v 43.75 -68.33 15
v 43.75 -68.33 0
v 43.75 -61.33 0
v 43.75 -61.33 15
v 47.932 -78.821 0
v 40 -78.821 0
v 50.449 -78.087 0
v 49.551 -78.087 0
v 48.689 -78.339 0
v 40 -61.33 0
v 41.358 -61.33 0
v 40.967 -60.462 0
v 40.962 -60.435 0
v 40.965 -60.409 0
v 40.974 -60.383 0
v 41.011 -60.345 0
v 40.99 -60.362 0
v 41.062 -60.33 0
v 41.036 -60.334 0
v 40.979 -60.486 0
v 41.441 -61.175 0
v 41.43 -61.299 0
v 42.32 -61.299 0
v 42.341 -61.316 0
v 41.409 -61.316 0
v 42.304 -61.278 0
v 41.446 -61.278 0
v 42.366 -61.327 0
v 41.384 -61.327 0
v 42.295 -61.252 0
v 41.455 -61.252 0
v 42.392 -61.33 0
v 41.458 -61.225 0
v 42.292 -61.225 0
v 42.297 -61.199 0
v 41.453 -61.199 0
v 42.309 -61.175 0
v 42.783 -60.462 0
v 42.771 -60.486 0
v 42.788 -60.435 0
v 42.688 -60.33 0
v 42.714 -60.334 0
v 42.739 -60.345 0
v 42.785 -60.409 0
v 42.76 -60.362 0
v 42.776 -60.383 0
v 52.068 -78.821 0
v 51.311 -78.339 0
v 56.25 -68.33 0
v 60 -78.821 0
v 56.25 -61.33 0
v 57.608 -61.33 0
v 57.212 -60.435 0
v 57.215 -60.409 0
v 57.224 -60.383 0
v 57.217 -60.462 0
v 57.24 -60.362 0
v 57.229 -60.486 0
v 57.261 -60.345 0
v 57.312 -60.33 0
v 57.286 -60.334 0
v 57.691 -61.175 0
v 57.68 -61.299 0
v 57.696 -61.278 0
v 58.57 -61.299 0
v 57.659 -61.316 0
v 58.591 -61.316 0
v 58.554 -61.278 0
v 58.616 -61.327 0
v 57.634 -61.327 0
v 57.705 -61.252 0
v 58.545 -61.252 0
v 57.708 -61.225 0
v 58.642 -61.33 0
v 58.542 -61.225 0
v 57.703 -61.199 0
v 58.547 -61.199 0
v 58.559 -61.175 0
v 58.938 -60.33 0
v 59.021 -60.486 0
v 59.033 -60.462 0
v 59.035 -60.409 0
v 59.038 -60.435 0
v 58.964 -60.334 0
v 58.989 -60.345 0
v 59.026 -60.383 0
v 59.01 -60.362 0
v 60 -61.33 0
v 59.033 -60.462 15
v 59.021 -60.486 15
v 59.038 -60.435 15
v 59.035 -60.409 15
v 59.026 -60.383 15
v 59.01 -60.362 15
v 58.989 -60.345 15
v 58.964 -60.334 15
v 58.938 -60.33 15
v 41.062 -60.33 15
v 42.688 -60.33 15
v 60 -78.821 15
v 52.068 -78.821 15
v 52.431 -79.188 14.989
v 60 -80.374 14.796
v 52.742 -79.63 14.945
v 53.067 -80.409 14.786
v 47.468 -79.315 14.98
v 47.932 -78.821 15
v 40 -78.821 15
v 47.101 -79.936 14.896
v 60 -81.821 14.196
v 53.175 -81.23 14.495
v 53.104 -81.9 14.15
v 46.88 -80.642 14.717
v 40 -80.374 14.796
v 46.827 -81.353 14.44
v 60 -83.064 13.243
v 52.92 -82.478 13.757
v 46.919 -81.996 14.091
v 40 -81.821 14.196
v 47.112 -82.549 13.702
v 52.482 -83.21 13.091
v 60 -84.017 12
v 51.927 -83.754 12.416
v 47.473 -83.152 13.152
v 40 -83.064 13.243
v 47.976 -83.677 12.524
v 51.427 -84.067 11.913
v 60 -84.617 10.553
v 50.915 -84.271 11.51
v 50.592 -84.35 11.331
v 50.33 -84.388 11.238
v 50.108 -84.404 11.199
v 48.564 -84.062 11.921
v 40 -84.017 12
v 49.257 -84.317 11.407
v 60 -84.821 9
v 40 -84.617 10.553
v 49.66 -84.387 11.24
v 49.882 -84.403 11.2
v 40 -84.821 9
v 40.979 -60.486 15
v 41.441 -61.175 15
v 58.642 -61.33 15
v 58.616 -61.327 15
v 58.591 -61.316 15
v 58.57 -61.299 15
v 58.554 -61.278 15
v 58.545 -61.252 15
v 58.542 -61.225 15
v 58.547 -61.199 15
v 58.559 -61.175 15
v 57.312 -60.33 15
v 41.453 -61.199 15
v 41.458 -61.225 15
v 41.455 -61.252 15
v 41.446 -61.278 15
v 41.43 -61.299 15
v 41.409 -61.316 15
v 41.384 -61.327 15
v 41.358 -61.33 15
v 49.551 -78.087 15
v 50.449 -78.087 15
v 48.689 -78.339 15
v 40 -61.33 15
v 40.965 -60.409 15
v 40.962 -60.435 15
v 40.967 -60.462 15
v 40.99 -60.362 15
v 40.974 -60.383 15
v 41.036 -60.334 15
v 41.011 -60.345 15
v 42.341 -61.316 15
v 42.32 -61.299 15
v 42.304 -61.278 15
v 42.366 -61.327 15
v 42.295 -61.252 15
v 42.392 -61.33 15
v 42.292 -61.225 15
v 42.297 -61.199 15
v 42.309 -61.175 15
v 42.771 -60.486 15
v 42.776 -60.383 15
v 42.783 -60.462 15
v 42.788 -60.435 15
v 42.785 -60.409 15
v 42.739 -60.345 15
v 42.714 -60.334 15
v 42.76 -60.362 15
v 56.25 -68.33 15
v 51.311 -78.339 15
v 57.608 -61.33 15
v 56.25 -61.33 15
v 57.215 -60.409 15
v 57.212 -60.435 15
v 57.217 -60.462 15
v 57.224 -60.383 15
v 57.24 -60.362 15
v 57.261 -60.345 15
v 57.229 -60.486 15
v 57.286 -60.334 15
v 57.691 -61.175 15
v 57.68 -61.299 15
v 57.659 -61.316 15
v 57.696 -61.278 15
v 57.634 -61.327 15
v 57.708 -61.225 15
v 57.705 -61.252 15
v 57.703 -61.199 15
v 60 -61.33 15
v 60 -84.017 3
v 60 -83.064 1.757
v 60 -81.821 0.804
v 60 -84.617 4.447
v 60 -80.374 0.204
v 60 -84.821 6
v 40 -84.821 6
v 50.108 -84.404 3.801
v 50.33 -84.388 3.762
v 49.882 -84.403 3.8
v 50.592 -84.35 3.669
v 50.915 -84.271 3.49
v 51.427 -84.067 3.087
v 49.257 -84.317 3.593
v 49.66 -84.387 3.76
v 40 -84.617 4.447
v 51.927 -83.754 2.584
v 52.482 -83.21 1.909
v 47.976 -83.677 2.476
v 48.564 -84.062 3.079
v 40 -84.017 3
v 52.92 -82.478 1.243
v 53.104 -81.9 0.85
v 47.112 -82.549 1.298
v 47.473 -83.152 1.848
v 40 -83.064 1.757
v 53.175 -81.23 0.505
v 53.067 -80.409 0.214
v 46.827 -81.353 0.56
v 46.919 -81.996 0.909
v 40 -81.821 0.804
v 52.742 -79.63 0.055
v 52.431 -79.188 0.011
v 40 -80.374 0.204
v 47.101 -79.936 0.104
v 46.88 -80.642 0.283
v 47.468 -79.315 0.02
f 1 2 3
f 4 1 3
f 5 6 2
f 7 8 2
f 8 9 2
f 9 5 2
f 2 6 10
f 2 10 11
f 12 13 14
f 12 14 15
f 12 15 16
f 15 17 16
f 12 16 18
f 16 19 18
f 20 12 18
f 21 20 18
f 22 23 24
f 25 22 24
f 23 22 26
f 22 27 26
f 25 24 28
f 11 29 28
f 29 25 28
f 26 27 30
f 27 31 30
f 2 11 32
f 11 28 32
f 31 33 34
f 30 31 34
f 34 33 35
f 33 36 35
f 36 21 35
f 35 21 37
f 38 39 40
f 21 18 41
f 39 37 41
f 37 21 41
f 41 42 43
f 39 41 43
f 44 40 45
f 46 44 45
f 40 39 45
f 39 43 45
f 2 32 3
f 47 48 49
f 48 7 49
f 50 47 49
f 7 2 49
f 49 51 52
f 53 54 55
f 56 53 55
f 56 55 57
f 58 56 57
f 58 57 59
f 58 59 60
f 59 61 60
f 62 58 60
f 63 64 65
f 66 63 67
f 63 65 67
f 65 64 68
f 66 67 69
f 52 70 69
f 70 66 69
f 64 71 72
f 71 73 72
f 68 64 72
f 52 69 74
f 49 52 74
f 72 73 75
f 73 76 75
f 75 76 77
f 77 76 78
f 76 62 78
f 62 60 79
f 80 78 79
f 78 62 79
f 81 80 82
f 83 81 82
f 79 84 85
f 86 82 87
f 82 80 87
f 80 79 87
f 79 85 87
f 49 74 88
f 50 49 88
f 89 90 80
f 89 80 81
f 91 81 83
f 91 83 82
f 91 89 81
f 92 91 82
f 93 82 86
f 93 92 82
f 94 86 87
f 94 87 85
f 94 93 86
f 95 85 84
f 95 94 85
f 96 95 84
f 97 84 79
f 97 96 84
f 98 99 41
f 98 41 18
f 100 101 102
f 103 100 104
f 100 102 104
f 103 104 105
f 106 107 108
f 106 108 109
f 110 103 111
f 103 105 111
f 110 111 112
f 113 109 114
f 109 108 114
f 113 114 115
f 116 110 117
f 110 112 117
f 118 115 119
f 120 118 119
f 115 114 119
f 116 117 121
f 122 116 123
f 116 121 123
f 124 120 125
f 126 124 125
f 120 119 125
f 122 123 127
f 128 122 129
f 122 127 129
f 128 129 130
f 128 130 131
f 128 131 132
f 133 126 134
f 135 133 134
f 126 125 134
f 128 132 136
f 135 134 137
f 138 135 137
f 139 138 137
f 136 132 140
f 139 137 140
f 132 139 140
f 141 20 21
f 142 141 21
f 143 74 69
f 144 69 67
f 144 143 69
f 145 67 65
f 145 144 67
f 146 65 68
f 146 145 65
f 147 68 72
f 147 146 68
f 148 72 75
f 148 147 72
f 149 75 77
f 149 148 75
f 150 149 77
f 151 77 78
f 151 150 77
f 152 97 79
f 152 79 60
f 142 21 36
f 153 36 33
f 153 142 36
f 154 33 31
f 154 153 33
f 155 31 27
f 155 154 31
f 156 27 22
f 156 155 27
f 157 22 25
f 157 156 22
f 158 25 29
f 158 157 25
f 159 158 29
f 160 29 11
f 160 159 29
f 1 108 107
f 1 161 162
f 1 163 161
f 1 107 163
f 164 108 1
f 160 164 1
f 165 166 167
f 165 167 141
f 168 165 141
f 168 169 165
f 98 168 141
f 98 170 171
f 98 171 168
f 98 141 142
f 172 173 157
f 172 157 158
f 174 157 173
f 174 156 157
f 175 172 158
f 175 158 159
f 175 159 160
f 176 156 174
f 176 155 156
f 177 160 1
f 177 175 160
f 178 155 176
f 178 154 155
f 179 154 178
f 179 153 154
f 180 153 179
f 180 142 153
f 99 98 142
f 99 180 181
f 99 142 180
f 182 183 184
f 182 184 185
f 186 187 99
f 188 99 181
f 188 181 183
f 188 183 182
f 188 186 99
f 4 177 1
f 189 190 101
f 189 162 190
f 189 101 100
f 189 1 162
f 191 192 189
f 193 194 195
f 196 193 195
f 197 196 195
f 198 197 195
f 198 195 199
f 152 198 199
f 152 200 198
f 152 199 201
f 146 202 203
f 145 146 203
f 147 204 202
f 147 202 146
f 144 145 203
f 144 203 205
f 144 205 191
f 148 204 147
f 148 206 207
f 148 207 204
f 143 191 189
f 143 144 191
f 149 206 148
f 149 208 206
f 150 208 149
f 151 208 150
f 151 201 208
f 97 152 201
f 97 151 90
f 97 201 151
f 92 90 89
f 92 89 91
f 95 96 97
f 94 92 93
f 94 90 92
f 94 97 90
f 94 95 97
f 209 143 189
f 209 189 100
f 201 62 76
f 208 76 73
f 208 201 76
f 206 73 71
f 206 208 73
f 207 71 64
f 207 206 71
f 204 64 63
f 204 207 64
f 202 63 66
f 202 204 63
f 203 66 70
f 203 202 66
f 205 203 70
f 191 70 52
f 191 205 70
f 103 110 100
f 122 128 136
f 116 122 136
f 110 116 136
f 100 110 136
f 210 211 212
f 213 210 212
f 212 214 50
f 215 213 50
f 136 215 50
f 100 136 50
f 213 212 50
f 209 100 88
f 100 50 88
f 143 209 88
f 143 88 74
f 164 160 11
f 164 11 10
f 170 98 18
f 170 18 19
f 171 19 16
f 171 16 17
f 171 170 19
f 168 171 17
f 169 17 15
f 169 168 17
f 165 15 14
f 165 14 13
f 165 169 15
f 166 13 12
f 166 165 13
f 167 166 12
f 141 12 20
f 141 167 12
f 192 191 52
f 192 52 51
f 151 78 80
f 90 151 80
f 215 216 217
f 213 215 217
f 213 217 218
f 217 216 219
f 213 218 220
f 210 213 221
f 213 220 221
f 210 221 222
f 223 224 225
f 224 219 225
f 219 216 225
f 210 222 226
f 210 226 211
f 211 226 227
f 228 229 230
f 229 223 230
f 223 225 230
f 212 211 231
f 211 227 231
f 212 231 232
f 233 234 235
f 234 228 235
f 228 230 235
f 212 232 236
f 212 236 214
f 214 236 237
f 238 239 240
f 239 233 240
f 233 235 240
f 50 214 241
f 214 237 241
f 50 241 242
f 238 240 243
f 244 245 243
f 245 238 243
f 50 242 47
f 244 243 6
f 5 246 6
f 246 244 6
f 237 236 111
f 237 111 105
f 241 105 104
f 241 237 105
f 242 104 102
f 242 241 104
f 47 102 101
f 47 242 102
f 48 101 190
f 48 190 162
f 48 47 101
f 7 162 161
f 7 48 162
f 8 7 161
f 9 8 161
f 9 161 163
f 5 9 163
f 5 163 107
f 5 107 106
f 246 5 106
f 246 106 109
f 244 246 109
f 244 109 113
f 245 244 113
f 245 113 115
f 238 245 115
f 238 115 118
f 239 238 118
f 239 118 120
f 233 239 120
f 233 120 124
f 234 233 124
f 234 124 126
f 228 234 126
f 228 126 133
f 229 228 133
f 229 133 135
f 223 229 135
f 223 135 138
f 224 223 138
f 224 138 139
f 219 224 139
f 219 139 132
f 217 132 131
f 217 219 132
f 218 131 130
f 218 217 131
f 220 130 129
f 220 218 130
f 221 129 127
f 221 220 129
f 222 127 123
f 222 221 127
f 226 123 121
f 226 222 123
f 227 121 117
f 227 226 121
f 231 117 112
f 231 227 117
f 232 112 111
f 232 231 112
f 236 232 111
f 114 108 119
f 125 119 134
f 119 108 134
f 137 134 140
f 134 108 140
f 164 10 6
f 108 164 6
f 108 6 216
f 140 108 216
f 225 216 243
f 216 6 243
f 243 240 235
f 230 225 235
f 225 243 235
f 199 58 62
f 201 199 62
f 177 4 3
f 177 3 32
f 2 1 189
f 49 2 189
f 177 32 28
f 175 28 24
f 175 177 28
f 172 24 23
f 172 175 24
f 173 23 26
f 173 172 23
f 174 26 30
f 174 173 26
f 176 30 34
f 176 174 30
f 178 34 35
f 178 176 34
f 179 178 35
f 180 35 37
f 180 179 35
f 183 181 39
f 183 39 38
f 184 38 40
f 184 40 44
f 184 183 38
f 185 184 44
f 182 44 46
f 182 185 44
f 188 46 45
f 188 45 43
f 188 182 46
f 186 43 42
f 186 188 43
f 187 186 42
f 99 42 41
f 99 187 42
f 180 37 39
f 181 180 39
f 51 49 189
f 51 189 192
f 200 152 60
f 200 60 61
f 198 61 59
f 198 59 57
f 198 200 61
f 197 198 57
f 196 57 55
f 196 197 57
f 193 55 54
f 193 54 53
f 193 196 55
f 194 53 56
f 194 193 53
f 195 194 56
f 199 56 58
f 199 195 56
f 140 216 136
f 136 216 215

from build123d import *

# Parameters (mm, degrees)
SKETCH1_R           = 3.175
SKETCH1_W           = 12.5
SKETCH1_H           = 14
BOSS_EXTRUDE1_DEPTH = 15
SKETCH3_R           = 1.95
CUT_EXTRUDE2_DEPTH  = 7.5
BOSS_EXTRUDE2_DEPTH = 3.75
FILLET1_R           = 6
FILLET2_R           = 6
FILLET3_R           = 5
FILLET4_R           = 7.5
FILLET5_R           = 6
FILLET6_R           = 6
CUT_EXTRUDE4_DEPTH  = 20
SKETCH2_R           = 2.5
CUT_EXTRUDE1_DEPTH  = 10


with BuildPart() as part:
    # Sketch1 → Boss-Extrude1 (new body)
    with BuildSketch(Plane.XY):
        Polygon((60, -37.839734641), (55, -37.839734641), (45, -37.839734641), (40, -37.839734641), (40, -84.821135581), (60, -84.821135581), align=None)
        with Locations((50, -81.230435111)):
            Circle(SKETCH1_R, mode=Mode.SUBTRACT)
        with Locations((50, -61.330435111)):
            Rectangle(SKETCH1_W, SKETCH1_H, mode=Mode.SUBTRACT)
        with Locations((50, -41.430435111)):
            Circle(SKETCH1_R, mode=Mode.SUBTRACT)
    extrude(amount=BOSS_EXTRUDE1_DEPTH)

    # Sketch3 → Cut-Extrude2 (cut)
    with BuildSketch(Plane.XZ.offset(54.330435111)):
        with Locations(Location((50, 10, 0), (0, 0, 270))):
            Circle(SKETCH3_R)
    extrude(amount=-CUT_EXTRUDE2_DEPTH, mode=Mode.SUBTRACT)

    # Sketch6 → Boss-Extrude2 (add, symmetric)
    with BuildSketch(Plane.XY.offset(7.5)):
        Polygon((-46.25, -23.832633625), (46.25, -23.832633625), (53.75, -23.832633625), (53.75, -13.832633625), (-46.25, -13.832633625), align=None)
        Polygon((53.75, -23.832633625), (46.25, -23.832633625), (46.25, -37.839734641), (50, -37.839734641), (53.75, -37.839734641), align=None)
    extrude(amount=BOSS_EXTRUDE2_DEPTH, both=True)

    # Fillet1
    # the kernel refuses this fillet: 6 mm, written as the material it takes off along each edge
    with BuildSketch(Plane(origin=(75, -37.839734641, 0), x_dir=(0, 0, 1), z_dir=(-1, 0, 0))) as fillet1_piece_1_section:
        with BuildLine():
            CenterArc((FILLET1_R, -FILLET1_R), FILLET1_R, 90, 90)
            Line((0, -FILLET1_R), (0, 0))
            Line((0, 0), (FILLET1_R, 0))
        make_face()
    fillet1_piece_1 = extrude(amount=50, mode=Mode.PRIVATE)
    fillet1_piece_1 = split(fillet1_piece_1, bisect_by=Plane(origin=(53.75, -37.839734641, 0), z_dir=(1, 0, 0)), keep=Keep.TOP, mode=Mode.PRIVATE)
    fillet1_piece_1 = split(fillet1_piece_1, bisect_by=Plane(origin=(75, -37.839734641, 3.75), z_dir=(0, 0, 1)), keep=Keep.TOP, mode=Mode.PRIVATE)
    add(fillet1_piece_1, mode=Mode.SUBTRACT)
    with BuildSketch(Plane(origin=(75, -37.839734641, 0), x_dir=(0, 0, 1), z_dir=(-1, 0, 0))) as fillet1_piece_2_section:
        with BuildLine():
            CenterArc((FILLET1_R, -FILLET1_R), FILLET1_R, 90, 90)
            Line((0, -FILLET1_R), (0, 0))
            Line((0, 0), (FILLET1_R, 0))
        make_face()
    fillet1_piece_2 = extrude(amount=50, mode=Mode.PRIVATE)
    fillet1_piece_2 = split(fillet1_piece_2, bisect_by=Plane(origin=(53.75, -37.839734641, 0), z_dir=(1, 0, 0)), keep=Keep.TOP, mode=Mode.PRIVATE)
    fillet1_piece_2 = split(fillet1_piece_2, bisect_by=Plane(origin=(75, -37.839734641, 3.75), z_dir=(0, 0, -1)), keep=Keep.TOP, mode=Mode.PRIVATE)
    add(fillet1_piece_2, mode=Mode.SUBTRACT)
    with BuildSketch(Plane(origin=(75, -37.839734641, 0), x_dir=(0, 0, 1), z_dir=(-1, 0, 0))) as fillet1_piece_3_section:
        with BuildLine():
            CenterArc((FILLET1_R, -FILLET1_R), FILLET1_R, 90, 90)
            Line((0, -FILLET1_R), (0, 0))
            Line((0, 0), (FILLET1_R, 0))
        make_face()
    fillet1_piece_3 = extrude(amount=50, mode=Mode.PRIVATE)
    fillet1_piece_3 = split(fillet1_piece_3, bisect_by=Plane(origin=(53.75, -37.839734641, 0), z_dir=(-1, 0, 0)), keep=Keep.TOP, mode=Mode.PRIVATE)
    fillet1_piece_3 = split(fillet1_piece_3, bisect_by=Plane(origin=(46.25, -37.839734641, 0), z_dir=(1, 0, 0)), keep=Keep.TOP, mode=Mode.PRIVATE)
    fillet1_piece_3 = split(fillet1_piece_3, bisect_by=Plane(origin=(75, -37.839734641, 3.75), z_dir=(0, 0, -1)), keep=Keep.TOP, mode=Mode.PRIVATE)
    add(fillet1_piece_3, mode=Mode.SUBTRACT)
    with BuildSketch(Plane(origin=(75, -37.839734641, 0), x_dir=(0, 0, 1), z_dir=(-1, 0, 0))) as fillet1_piece_4_section:
        with BuildLine():
            CenterArc((FILLET1_R, -FILLET1_R), FILLET1_R, 90, 90)
            Line((0, -FILLET1_R), (0, 0))
            Line((0, 0), (FILLET1_R, 0))
        make_face()
    fillet1_piece_4 = extrude(amount=50, mode=Mode.PRIVATE)
    fillet1_piece_4 = split(fillet1_piece_4, bisect_by=Plane(origin=(46.25, -37.839734641, 0), z_dir=(-1, 0, 0)), keep=Keep.TOP, mode=Mode.PRIVATE)
    fillet1_piece_4 = split(fillet1_piece_4, bisect_by=Plane(origin=(75, -37.839734641, 3.75), z_dir=(0, 0, 1)), keep=Keep.TOP, mode=Mode.PRIVATE)
    add(fillet1_piece_4, mode=Mode.SUBTRACT)
    with BuildSketch(Plane(origin=(75, -37.839734641, 0), x_dir=(0, 0, 1), z_dir=(-1, 0, 0))) as fillet1_piece_5_section:
        with BuildLine():
            CenterArc((FILLET1_R, -FILLET1_R), FILLET1_R, 90, 90)
            Line((0, -FILLET1_R), (0, 0))
            Line((0, 0), (FILLET1_R, 0))
        make_face()
    fillet1_piece_5 = extrude(amount=50, mode=Mode.PRIVATE)
    fillet1_piece_5 = split(fillet1_piece_5, bisect_by=Plane(origin=(46.25, -37.839734641, 0), z_dir=(-1, 0, 0)), keep=Keep.TOP, mode=Mode.PRIVATE)
    fillet1_piece_5 = split(fillet1_piece_5, bisect_by=Plane(origin=(75, -37.839734641, 3.75), z_dir=(0, 0, -1)), keep=Keep.TOP, mode=Mode.PRIVATE)
    add(fillet1_piece_5, mode=Mode.SUBTRACT)
    with BuildSketch(Plane(origin=(25, -37.839734641, 15), x_dir=(0, 0, -1), z_dir=(1, 0, 0))) as fillet1_piece_6_section:
        with BuildLine():
            CenterArc((FILLET1_R, -FILLET1_R), FILLET1_R, 90, 90)
            Line((0, -FILLET1_R), (0, 0))
            Line((0, 0), (FILLET1_R, 0))
        make_face()
    fillet1_piece_6 = extrude(amount=50, mode=Mode.PRIVATE)
    fillet1_piece_6 = split(fillet1_piece_6, bisect_by=Plane(origin=(25, -37.839734641, 11.25), z_dir=(0, 0, -1)), keep=Keep.TOP, mode=Mode.PRIVATE)
    fillet1_piece_6 = split(fillet1_piece_6, bisect_by=Plane(origin=(46.25, -37.839734641, 15), z_dir=(-1, 0, 0)), keep=Keep.TOP, mode=Mode.PRIVATE)
    add(fillet1_piece_6, mode=Mode.SUBTRACT)
    with BuildSketch(Plane(origin=(25, -37.839734641, 15), x_dir=(0, 0, -1), z_dir=(1, 0, 0))) as fillet1_piece_7_section:
        with BuildLine():
            CenterArc((FILLET1_R, -FILLET1_R), FILLET1_R, 90, 90)
            Line((0, -FILLET1_R), (0, 0))
            Line((0, 0), (FILLET1_R, 0))
        make_face()
    fillet1_piece_7 = extrude(amount=50, mode=Mode.PRIVATE)
    fillet1_piece_7 = split(fillet1_piece_7, bisect_by=Plane(origin=(25, -37.839734641, 11.25), z_dir=(0, 0, 1)), keep=Keep.TOP, mode=Mode.PRIVATE)
    fillet1_piece_7 = split(fillet1_piece_7, bisect_by=Plane(origin=(46.25, -37.839734641, 15), z_dir=(-1, 0, 0)), keep=Keep.TOP, mode=Mode.PRIVATE)
    add(fillet1_piece_7, mode=Mode.SUBTRACT)
    with BuildSketch(Plane(origin=(25, -37.839734641, 15), x_dir=(0, 0, -1), z_dir=(1, 0, 0))) as fillet1_piece_8_section:
        with BuildLine():
            CenterArc((FILLET1_R, -FILLET1_R), FILLET1_R, 90, 90)
            Line((0, -FILLET1_R), (0, 0))
            Line((0, 0), (FILLET1_R, 0))
        make_face()
    fillet1_piece_8 = extrude(amount=50, mode=Mode.PRIVATE)
    fillet1_piece_8 = split(fillet1_piece_8, bisect_by=Plane(origin=(53.75, -37.839734641, 15), z_dir=(-1, 0, 0)), keep=Keep.TOP, mode=Mode.PRIVATE)
    fillet1_piece_8 = split(fillet1_piece_8, bisect_by=Plane(origin=(25, -37.839734641, 11.25), z_dir=(0, 0, 1)), keep=Keep.TOP, mode=Mode.PRIVATE)
    fillet1_piece_8 = split(fillet1_piece_8, bisect_by=Plane(origin=(46.25, -37.839734641, 15), z_dir=(1, 0, 0)), keep=Keep.TOP, mode=Mode.PRIVATE)
    add(fillet1_piece_8, mode=Mode.SUBTRACT)
    with BuildSketch(Plane(origin=(25, -37.839734641, 15), x_dir=(0, 0, -1), z_dir=(1, 0, 0))) as fillet1_piece_9_section:
        with BuildLine():
            CenterArc((FILLET1_R, -FILLET1_R), FILLET1_R, 90, 90)
            Line((0, -FILLET1_R), (0, 0))
            Line((0, 0), (FILLET1_R, 0))
        make_face()
    fillet1_piece_9 = extrude(amount=50, mode=Mode.PRIVATE)
    fillet1_piece_9 = split(fillet1_piece_9, bisect_by=Plane(origin=(53.75, -37.839734641, 15), z_dir=(1, 0, 0)), keep=Keep.TOP, mode=Mode.PRIVATE)
    fillet1_piece_9 = split(fillet1_piece_9, bisect_by=Plane(origin=(25, -37.839734641, 11.25), z_dir=(0, 0, -1)), keep=Keep.TOP, mode=Mode.PRIVATE)
    add(fillet1_piece_9, mode=Mode.SUBTRACT)
    with BuildSketch(Plane(origin=(25, -37.839734641, 15), x_dir=(0, 0, -1), z_dir=(1, 0, 0))) as fillet1_piece_10_section:
        with BuildLine():
            CenterArc((FILLET1_R, -FILLET1_R), FILLET1_R, 90, 90)
            Line((0, -FILLET1_R), (0, 0))
            Line((0, 0), (FILLET1_R, 0))
        make_face()
    fillet1_piece_10 = extrude(amount=50, mode=Mode.PRIVATE)
    fillet1_piece_10 = split(fillet1_piece_10, bisect_by=Plane(origin=(53.75, -37.839734641, 15), z_dir=(1, 0, 0)), keep=Keep.TOP, mode=Mode.PRIVATE)
    fillet1_piece_10 = split(fillet1_piece_10, bisect_by=Plane(origin=(25, -37.839734641, 11.25), z_dir=(0, 0, 1)), keep=Keep.TOP, mode=Mode.PRIVATE)
    add(fillet1_piece_10, mode=Mode.SUBTRACT)

    # Fillet2
    # the kernel refuses this fillet: 6 mm, written as the material it takes off along each edge
    with BuildSketch(Plane(origin=(25, -84.821135581, 0), x_dir=(0, 1, 0), z_dir=(1, 0, 0))) as fillet2_piece_1:
        with BuildLine():
            CenterArc((FILLET2_R, FILLET2_R), FILLET2_R, 180, 90)
            Line((0, FILLET2_R), (0, 0))
            Line((0, 0), (FILLET2_R, 0))
        make_face()
    extrude(amount=50, mode=Mode.SUBTRACT)
    with BuildSketch(Plane(origin=(25, -84.821135581, 15), x_dir=(0, 1, 0), z_dir=(1, 0, 0))) as fillet2_piece_2:
        with BuildLine():
            CenterArc((FILLET2_R, -FILLET2_R), FILLET2_R, 90, 90)
            Line((0, -FILLET2_R), (0, 0))
            Line((0, 0), (FILLET2_R, 0))
        make_face()
    extrude(amount=50, mode=Mode.SUBTRACT)

    # Fillet3
    fillet3_edges = [part.edges().sort_by_distance(p)[0] for p in [
        (3.75, -13.832633625, 3.75),
    ]]
    fillet(fillet3_edges, radius=FILLET3_R)

    # Fillet4
    # the kernel refuses this fillet: 7.5 mm, written as the material it takes off along each edge
    with BuildSketch(Plane(origin=(-63.92766953, -23.832633625, 3.75), x_dir=(0, 1, 0), z_dir=(1, 0, 0))) as fillet4_piece_1:
        with BuildLine():
            CenterArc((7.5, 7.071067812), FILLET4_R, 180, 70.528779366)
            Line((0, 7.071067812), (0, 0))
            Line((0, 0), (5, 0))
        make_face()
    extrude(amount=110.17766953, mode=Mode.SUBTRACT)

    # Fillet5
    # the kernel refuses this fillet: 6 mm, written as the material it adds along each edge
    with BuildSketch(Plane(origin=(53.75, -38.277585776, 11.25), x_dir=(0, 1, 0), z_dir=(-1, 0, 0))) as fillet5_piece_1_section:
        with BuildLine():
            CenterArc((3.152063664, -6), FILLET5_R, 90, 46.567463442)
            ThreePointArc((-1.205042601, -1.875), (-0.514692889, -0.993946388), (0, 0))
            Line((0, 0), (3.152063664, 0))
        make_face()
    fillet5_piece_1 = extrude(amount=11.255771566, mode=Mode.PRIVATE)
    fillet5_piece_1 = fillet5_piece_1 - Plane(origin=(50, -41.430435111, 11.25), x_dir=(1, 0, 0), z_dir=(0, 0, -1)) * Cylinder(3.175, 36, mode=Mode.PRIVATE)
    fillet5_piece_1 = split(fillet5_piece_1, bisect_by=Plane(origin=(46.25, -38.277585776, 11.25), z_dir=(1, 0, 0)), keep=Keep.TOP, mode=Mode.PRIVATE)
    add(fillet5_piece_1)
    with BuildSketch(Plane(origin=(57.505771566, -38.277585776, 11.25), x_dir=(0, -0.5406577313138206, 0.8412426627142685), z_dir=(-1, 0, 0))) as fillet5_piece_2_section:
        with BuildLine():
            CenterArc((3.343268387, 5.895596817), FILLET5_R, 212.728424697, 46.567463442)
            Line((-1.704187589, 2.651650429), (0, 0))
            ThreePointArc((0, 0), (1.114422796, 0.104403183), (2.228845591, 0))
        make_face()
    fillet5_piece_2 = extrude(amount=11.255771566, mode=Mode.PRIVATE)
    fillet5_piece_2 = fillet5_piece_2 - Plane(origin=(50, -41.430435111, 11.25), x_dir=(1, 0, 0), z_dir=(0, 0, -1)) * Cylinder(3.175, 34, mode=Mode.PRIVATE)
    fillet5_piece_2 = split(fillet5_piece_2, bisect_by=Plane(origin=(53.75, -38.277585776, 11.25), z_dir=(-1, 0, 0)), keep=Keep.TOP, mode=Mode.PRIVATE)
    add(fillet5_piece_2)

    # Fillet6
    # the kernel refuses this fillet: 6 mm, written as the material it adds along each edge
    with BuildSketch(Plane(origin=(46.25, -38.277585776, 3.75), x_dir=(0, 1, 0), z_dir=(1, 0, 0))) as fillet6_piece_1_section:
        with BuildLine():
            CenterArc((3.152063664, -6), FILLET6_R, 90, 46.567463442)
            ThreePointArc((-1.205042601, -1.875), (-0.514692889, -0.993946388), (0, 0))
            Line((0, 0), (3.152063664, 0))
        make_face()
    fillet6_piece_1 = extrude(amount=11.255771566, mode=Mode.PRIVATE)
    fillet6_piece_1 = split(fillet6_piece_1, bisect_by=Plane(origin=(53.75, -38.277585776, 3.75), z_dir=(-1, 0, 0)), keep=Keep.TOP, mode=Mode.PRIVATE)
    fillet6_piece_1 = fillet6_piece_1 - Plane(origin=(50, -41.430435111, 3.75), x_dir=(1, 0, 0), z_dir=(0, 0, -1)) * Cylinder(3.175, 36, mode=Mode.PRIVATE)
    add(fillet6_piece_1)
    with BuildSketch(Plane(origin=(42.494228434, -38.277585776, 3.75), x_dir=(0, 1, 0), z_dir=(1, 0, 0))) as fillet6_piece_2_section:
        with BuildLine():
            CenterArc((3.152063664, -6), FILLET6_R, 90, 46.567463442)
            ThreePointArc((-1.205042601, -1.875), (-0.514692889, -0.993946388), (0, 0))
            Line((0, 0), (3.152063664, 0))
        make_face()
    fillet6_piece_2 = extrude(amount=11.255771566, mode=Mode.PRIVATE)
    fillet6_piece_2 = split(fillet6_piece_2, bisect_by=Plane(origin=(46.25, -38.277585776, 3.75), z_dir=(1, 0, 0)), keep=Keep.TOP, mode=Mode.PRIVATE)
    fillet6_piece_2 = fillet6_piece_2 - Plane(origin=(50, -41.430435111, 3.75), x_dir=(1, 0, 0), z_dir=(0, 0, -1)) * Cylinder(3.175, 36, mode=Mode.PRIVATE)
    add(fillet6_piece_2)

    # Sketch7 → Cut-Extrude4 (cut)
    with BuildSketch(Plane.XY.offset(15)):
        with BuildLine():
            Line((42.687629738, -60.330435111), (41.062370262, -60.330435111))
            ThreePointArc((41.062370262, -60.330435111), (40.974148499, -60.383350925), (40.979293264, -60.486096699))
            Line((40.979293264, -60.486096699), (41.440706736, -61.174773522))
            ThreePointArc((41.440706736, -61.174773522), (41.445851501, -61.277519297), (41.357629738, -61.330435111))
            Line((41.357629738, -61.330435111), (-57.000451656, -61.330435111))
            Line((-57.000451656, -61.330435111), (-57.000451656, -7.955917112))
            Line((-57.000451656, -7.955917112), (60, -7.955917112))
            Line((60, -7.955917112), (60, -61.330435111))
            Line((60, -61.330435111), (58.642370262, -61.330435111))
            ThreePointArc((58.642370262, -61.330435111), (58.554148499, -61.277519297), (58.559293264, -61.174773522))
            Line((58.559293264, -61.174773522), (59.020706736, -60.486096699))
            ThreePointArc((59.020706736, -60.486096699), (59.025851501, -60.383350925), (58.937629738, -60.330435111))
            Line((58.937629738, -60.330435111), (57.312370262, -60.330435111))
            ThreePointArc((57.312370262, -60.330435111), (57.224148499, -60.383350925), (57.229293264, -60.486096699))
            Line((57.229293264, -60.486096699), (57.690706736, -61.174773522))
            ThreePointArc((57.690706736, -61.174773522), (57.695851501, -61.277519297), (57.607629738, -61.330435111))
            Line((57.607629738, -61.330435111), (42.392370262, -61.330435111))
            ThreePointArc((42.392370262, -61.330435111), (42.304148499, -61.277519297), (42.309293264, -61.174773522))
            Line((42.309293264, -61.174773522), (42.770706736, -60.486096699))
            ThreePointArc((42.770706736, -60.486096699), (42.775851501, -60.383350925), (42.687629738, -60.330435111))
        make_face()
    extrude(amount=-CUT_EXTRUDE4_DEPTH, mode=Mode.SUBTRACT)

    # Sketch2 → Cut-Extrude1 (cut)
    with BuildSketch(Plane.XZ.offset(40)):
        with Locations((40, 9.937454881)):
            Circle(SKETCH2_R)
    extrude(amount=-CUT_EXTRUDE1_DEPTH, mode=Mode.SUBTRACT)


solid = part.part
